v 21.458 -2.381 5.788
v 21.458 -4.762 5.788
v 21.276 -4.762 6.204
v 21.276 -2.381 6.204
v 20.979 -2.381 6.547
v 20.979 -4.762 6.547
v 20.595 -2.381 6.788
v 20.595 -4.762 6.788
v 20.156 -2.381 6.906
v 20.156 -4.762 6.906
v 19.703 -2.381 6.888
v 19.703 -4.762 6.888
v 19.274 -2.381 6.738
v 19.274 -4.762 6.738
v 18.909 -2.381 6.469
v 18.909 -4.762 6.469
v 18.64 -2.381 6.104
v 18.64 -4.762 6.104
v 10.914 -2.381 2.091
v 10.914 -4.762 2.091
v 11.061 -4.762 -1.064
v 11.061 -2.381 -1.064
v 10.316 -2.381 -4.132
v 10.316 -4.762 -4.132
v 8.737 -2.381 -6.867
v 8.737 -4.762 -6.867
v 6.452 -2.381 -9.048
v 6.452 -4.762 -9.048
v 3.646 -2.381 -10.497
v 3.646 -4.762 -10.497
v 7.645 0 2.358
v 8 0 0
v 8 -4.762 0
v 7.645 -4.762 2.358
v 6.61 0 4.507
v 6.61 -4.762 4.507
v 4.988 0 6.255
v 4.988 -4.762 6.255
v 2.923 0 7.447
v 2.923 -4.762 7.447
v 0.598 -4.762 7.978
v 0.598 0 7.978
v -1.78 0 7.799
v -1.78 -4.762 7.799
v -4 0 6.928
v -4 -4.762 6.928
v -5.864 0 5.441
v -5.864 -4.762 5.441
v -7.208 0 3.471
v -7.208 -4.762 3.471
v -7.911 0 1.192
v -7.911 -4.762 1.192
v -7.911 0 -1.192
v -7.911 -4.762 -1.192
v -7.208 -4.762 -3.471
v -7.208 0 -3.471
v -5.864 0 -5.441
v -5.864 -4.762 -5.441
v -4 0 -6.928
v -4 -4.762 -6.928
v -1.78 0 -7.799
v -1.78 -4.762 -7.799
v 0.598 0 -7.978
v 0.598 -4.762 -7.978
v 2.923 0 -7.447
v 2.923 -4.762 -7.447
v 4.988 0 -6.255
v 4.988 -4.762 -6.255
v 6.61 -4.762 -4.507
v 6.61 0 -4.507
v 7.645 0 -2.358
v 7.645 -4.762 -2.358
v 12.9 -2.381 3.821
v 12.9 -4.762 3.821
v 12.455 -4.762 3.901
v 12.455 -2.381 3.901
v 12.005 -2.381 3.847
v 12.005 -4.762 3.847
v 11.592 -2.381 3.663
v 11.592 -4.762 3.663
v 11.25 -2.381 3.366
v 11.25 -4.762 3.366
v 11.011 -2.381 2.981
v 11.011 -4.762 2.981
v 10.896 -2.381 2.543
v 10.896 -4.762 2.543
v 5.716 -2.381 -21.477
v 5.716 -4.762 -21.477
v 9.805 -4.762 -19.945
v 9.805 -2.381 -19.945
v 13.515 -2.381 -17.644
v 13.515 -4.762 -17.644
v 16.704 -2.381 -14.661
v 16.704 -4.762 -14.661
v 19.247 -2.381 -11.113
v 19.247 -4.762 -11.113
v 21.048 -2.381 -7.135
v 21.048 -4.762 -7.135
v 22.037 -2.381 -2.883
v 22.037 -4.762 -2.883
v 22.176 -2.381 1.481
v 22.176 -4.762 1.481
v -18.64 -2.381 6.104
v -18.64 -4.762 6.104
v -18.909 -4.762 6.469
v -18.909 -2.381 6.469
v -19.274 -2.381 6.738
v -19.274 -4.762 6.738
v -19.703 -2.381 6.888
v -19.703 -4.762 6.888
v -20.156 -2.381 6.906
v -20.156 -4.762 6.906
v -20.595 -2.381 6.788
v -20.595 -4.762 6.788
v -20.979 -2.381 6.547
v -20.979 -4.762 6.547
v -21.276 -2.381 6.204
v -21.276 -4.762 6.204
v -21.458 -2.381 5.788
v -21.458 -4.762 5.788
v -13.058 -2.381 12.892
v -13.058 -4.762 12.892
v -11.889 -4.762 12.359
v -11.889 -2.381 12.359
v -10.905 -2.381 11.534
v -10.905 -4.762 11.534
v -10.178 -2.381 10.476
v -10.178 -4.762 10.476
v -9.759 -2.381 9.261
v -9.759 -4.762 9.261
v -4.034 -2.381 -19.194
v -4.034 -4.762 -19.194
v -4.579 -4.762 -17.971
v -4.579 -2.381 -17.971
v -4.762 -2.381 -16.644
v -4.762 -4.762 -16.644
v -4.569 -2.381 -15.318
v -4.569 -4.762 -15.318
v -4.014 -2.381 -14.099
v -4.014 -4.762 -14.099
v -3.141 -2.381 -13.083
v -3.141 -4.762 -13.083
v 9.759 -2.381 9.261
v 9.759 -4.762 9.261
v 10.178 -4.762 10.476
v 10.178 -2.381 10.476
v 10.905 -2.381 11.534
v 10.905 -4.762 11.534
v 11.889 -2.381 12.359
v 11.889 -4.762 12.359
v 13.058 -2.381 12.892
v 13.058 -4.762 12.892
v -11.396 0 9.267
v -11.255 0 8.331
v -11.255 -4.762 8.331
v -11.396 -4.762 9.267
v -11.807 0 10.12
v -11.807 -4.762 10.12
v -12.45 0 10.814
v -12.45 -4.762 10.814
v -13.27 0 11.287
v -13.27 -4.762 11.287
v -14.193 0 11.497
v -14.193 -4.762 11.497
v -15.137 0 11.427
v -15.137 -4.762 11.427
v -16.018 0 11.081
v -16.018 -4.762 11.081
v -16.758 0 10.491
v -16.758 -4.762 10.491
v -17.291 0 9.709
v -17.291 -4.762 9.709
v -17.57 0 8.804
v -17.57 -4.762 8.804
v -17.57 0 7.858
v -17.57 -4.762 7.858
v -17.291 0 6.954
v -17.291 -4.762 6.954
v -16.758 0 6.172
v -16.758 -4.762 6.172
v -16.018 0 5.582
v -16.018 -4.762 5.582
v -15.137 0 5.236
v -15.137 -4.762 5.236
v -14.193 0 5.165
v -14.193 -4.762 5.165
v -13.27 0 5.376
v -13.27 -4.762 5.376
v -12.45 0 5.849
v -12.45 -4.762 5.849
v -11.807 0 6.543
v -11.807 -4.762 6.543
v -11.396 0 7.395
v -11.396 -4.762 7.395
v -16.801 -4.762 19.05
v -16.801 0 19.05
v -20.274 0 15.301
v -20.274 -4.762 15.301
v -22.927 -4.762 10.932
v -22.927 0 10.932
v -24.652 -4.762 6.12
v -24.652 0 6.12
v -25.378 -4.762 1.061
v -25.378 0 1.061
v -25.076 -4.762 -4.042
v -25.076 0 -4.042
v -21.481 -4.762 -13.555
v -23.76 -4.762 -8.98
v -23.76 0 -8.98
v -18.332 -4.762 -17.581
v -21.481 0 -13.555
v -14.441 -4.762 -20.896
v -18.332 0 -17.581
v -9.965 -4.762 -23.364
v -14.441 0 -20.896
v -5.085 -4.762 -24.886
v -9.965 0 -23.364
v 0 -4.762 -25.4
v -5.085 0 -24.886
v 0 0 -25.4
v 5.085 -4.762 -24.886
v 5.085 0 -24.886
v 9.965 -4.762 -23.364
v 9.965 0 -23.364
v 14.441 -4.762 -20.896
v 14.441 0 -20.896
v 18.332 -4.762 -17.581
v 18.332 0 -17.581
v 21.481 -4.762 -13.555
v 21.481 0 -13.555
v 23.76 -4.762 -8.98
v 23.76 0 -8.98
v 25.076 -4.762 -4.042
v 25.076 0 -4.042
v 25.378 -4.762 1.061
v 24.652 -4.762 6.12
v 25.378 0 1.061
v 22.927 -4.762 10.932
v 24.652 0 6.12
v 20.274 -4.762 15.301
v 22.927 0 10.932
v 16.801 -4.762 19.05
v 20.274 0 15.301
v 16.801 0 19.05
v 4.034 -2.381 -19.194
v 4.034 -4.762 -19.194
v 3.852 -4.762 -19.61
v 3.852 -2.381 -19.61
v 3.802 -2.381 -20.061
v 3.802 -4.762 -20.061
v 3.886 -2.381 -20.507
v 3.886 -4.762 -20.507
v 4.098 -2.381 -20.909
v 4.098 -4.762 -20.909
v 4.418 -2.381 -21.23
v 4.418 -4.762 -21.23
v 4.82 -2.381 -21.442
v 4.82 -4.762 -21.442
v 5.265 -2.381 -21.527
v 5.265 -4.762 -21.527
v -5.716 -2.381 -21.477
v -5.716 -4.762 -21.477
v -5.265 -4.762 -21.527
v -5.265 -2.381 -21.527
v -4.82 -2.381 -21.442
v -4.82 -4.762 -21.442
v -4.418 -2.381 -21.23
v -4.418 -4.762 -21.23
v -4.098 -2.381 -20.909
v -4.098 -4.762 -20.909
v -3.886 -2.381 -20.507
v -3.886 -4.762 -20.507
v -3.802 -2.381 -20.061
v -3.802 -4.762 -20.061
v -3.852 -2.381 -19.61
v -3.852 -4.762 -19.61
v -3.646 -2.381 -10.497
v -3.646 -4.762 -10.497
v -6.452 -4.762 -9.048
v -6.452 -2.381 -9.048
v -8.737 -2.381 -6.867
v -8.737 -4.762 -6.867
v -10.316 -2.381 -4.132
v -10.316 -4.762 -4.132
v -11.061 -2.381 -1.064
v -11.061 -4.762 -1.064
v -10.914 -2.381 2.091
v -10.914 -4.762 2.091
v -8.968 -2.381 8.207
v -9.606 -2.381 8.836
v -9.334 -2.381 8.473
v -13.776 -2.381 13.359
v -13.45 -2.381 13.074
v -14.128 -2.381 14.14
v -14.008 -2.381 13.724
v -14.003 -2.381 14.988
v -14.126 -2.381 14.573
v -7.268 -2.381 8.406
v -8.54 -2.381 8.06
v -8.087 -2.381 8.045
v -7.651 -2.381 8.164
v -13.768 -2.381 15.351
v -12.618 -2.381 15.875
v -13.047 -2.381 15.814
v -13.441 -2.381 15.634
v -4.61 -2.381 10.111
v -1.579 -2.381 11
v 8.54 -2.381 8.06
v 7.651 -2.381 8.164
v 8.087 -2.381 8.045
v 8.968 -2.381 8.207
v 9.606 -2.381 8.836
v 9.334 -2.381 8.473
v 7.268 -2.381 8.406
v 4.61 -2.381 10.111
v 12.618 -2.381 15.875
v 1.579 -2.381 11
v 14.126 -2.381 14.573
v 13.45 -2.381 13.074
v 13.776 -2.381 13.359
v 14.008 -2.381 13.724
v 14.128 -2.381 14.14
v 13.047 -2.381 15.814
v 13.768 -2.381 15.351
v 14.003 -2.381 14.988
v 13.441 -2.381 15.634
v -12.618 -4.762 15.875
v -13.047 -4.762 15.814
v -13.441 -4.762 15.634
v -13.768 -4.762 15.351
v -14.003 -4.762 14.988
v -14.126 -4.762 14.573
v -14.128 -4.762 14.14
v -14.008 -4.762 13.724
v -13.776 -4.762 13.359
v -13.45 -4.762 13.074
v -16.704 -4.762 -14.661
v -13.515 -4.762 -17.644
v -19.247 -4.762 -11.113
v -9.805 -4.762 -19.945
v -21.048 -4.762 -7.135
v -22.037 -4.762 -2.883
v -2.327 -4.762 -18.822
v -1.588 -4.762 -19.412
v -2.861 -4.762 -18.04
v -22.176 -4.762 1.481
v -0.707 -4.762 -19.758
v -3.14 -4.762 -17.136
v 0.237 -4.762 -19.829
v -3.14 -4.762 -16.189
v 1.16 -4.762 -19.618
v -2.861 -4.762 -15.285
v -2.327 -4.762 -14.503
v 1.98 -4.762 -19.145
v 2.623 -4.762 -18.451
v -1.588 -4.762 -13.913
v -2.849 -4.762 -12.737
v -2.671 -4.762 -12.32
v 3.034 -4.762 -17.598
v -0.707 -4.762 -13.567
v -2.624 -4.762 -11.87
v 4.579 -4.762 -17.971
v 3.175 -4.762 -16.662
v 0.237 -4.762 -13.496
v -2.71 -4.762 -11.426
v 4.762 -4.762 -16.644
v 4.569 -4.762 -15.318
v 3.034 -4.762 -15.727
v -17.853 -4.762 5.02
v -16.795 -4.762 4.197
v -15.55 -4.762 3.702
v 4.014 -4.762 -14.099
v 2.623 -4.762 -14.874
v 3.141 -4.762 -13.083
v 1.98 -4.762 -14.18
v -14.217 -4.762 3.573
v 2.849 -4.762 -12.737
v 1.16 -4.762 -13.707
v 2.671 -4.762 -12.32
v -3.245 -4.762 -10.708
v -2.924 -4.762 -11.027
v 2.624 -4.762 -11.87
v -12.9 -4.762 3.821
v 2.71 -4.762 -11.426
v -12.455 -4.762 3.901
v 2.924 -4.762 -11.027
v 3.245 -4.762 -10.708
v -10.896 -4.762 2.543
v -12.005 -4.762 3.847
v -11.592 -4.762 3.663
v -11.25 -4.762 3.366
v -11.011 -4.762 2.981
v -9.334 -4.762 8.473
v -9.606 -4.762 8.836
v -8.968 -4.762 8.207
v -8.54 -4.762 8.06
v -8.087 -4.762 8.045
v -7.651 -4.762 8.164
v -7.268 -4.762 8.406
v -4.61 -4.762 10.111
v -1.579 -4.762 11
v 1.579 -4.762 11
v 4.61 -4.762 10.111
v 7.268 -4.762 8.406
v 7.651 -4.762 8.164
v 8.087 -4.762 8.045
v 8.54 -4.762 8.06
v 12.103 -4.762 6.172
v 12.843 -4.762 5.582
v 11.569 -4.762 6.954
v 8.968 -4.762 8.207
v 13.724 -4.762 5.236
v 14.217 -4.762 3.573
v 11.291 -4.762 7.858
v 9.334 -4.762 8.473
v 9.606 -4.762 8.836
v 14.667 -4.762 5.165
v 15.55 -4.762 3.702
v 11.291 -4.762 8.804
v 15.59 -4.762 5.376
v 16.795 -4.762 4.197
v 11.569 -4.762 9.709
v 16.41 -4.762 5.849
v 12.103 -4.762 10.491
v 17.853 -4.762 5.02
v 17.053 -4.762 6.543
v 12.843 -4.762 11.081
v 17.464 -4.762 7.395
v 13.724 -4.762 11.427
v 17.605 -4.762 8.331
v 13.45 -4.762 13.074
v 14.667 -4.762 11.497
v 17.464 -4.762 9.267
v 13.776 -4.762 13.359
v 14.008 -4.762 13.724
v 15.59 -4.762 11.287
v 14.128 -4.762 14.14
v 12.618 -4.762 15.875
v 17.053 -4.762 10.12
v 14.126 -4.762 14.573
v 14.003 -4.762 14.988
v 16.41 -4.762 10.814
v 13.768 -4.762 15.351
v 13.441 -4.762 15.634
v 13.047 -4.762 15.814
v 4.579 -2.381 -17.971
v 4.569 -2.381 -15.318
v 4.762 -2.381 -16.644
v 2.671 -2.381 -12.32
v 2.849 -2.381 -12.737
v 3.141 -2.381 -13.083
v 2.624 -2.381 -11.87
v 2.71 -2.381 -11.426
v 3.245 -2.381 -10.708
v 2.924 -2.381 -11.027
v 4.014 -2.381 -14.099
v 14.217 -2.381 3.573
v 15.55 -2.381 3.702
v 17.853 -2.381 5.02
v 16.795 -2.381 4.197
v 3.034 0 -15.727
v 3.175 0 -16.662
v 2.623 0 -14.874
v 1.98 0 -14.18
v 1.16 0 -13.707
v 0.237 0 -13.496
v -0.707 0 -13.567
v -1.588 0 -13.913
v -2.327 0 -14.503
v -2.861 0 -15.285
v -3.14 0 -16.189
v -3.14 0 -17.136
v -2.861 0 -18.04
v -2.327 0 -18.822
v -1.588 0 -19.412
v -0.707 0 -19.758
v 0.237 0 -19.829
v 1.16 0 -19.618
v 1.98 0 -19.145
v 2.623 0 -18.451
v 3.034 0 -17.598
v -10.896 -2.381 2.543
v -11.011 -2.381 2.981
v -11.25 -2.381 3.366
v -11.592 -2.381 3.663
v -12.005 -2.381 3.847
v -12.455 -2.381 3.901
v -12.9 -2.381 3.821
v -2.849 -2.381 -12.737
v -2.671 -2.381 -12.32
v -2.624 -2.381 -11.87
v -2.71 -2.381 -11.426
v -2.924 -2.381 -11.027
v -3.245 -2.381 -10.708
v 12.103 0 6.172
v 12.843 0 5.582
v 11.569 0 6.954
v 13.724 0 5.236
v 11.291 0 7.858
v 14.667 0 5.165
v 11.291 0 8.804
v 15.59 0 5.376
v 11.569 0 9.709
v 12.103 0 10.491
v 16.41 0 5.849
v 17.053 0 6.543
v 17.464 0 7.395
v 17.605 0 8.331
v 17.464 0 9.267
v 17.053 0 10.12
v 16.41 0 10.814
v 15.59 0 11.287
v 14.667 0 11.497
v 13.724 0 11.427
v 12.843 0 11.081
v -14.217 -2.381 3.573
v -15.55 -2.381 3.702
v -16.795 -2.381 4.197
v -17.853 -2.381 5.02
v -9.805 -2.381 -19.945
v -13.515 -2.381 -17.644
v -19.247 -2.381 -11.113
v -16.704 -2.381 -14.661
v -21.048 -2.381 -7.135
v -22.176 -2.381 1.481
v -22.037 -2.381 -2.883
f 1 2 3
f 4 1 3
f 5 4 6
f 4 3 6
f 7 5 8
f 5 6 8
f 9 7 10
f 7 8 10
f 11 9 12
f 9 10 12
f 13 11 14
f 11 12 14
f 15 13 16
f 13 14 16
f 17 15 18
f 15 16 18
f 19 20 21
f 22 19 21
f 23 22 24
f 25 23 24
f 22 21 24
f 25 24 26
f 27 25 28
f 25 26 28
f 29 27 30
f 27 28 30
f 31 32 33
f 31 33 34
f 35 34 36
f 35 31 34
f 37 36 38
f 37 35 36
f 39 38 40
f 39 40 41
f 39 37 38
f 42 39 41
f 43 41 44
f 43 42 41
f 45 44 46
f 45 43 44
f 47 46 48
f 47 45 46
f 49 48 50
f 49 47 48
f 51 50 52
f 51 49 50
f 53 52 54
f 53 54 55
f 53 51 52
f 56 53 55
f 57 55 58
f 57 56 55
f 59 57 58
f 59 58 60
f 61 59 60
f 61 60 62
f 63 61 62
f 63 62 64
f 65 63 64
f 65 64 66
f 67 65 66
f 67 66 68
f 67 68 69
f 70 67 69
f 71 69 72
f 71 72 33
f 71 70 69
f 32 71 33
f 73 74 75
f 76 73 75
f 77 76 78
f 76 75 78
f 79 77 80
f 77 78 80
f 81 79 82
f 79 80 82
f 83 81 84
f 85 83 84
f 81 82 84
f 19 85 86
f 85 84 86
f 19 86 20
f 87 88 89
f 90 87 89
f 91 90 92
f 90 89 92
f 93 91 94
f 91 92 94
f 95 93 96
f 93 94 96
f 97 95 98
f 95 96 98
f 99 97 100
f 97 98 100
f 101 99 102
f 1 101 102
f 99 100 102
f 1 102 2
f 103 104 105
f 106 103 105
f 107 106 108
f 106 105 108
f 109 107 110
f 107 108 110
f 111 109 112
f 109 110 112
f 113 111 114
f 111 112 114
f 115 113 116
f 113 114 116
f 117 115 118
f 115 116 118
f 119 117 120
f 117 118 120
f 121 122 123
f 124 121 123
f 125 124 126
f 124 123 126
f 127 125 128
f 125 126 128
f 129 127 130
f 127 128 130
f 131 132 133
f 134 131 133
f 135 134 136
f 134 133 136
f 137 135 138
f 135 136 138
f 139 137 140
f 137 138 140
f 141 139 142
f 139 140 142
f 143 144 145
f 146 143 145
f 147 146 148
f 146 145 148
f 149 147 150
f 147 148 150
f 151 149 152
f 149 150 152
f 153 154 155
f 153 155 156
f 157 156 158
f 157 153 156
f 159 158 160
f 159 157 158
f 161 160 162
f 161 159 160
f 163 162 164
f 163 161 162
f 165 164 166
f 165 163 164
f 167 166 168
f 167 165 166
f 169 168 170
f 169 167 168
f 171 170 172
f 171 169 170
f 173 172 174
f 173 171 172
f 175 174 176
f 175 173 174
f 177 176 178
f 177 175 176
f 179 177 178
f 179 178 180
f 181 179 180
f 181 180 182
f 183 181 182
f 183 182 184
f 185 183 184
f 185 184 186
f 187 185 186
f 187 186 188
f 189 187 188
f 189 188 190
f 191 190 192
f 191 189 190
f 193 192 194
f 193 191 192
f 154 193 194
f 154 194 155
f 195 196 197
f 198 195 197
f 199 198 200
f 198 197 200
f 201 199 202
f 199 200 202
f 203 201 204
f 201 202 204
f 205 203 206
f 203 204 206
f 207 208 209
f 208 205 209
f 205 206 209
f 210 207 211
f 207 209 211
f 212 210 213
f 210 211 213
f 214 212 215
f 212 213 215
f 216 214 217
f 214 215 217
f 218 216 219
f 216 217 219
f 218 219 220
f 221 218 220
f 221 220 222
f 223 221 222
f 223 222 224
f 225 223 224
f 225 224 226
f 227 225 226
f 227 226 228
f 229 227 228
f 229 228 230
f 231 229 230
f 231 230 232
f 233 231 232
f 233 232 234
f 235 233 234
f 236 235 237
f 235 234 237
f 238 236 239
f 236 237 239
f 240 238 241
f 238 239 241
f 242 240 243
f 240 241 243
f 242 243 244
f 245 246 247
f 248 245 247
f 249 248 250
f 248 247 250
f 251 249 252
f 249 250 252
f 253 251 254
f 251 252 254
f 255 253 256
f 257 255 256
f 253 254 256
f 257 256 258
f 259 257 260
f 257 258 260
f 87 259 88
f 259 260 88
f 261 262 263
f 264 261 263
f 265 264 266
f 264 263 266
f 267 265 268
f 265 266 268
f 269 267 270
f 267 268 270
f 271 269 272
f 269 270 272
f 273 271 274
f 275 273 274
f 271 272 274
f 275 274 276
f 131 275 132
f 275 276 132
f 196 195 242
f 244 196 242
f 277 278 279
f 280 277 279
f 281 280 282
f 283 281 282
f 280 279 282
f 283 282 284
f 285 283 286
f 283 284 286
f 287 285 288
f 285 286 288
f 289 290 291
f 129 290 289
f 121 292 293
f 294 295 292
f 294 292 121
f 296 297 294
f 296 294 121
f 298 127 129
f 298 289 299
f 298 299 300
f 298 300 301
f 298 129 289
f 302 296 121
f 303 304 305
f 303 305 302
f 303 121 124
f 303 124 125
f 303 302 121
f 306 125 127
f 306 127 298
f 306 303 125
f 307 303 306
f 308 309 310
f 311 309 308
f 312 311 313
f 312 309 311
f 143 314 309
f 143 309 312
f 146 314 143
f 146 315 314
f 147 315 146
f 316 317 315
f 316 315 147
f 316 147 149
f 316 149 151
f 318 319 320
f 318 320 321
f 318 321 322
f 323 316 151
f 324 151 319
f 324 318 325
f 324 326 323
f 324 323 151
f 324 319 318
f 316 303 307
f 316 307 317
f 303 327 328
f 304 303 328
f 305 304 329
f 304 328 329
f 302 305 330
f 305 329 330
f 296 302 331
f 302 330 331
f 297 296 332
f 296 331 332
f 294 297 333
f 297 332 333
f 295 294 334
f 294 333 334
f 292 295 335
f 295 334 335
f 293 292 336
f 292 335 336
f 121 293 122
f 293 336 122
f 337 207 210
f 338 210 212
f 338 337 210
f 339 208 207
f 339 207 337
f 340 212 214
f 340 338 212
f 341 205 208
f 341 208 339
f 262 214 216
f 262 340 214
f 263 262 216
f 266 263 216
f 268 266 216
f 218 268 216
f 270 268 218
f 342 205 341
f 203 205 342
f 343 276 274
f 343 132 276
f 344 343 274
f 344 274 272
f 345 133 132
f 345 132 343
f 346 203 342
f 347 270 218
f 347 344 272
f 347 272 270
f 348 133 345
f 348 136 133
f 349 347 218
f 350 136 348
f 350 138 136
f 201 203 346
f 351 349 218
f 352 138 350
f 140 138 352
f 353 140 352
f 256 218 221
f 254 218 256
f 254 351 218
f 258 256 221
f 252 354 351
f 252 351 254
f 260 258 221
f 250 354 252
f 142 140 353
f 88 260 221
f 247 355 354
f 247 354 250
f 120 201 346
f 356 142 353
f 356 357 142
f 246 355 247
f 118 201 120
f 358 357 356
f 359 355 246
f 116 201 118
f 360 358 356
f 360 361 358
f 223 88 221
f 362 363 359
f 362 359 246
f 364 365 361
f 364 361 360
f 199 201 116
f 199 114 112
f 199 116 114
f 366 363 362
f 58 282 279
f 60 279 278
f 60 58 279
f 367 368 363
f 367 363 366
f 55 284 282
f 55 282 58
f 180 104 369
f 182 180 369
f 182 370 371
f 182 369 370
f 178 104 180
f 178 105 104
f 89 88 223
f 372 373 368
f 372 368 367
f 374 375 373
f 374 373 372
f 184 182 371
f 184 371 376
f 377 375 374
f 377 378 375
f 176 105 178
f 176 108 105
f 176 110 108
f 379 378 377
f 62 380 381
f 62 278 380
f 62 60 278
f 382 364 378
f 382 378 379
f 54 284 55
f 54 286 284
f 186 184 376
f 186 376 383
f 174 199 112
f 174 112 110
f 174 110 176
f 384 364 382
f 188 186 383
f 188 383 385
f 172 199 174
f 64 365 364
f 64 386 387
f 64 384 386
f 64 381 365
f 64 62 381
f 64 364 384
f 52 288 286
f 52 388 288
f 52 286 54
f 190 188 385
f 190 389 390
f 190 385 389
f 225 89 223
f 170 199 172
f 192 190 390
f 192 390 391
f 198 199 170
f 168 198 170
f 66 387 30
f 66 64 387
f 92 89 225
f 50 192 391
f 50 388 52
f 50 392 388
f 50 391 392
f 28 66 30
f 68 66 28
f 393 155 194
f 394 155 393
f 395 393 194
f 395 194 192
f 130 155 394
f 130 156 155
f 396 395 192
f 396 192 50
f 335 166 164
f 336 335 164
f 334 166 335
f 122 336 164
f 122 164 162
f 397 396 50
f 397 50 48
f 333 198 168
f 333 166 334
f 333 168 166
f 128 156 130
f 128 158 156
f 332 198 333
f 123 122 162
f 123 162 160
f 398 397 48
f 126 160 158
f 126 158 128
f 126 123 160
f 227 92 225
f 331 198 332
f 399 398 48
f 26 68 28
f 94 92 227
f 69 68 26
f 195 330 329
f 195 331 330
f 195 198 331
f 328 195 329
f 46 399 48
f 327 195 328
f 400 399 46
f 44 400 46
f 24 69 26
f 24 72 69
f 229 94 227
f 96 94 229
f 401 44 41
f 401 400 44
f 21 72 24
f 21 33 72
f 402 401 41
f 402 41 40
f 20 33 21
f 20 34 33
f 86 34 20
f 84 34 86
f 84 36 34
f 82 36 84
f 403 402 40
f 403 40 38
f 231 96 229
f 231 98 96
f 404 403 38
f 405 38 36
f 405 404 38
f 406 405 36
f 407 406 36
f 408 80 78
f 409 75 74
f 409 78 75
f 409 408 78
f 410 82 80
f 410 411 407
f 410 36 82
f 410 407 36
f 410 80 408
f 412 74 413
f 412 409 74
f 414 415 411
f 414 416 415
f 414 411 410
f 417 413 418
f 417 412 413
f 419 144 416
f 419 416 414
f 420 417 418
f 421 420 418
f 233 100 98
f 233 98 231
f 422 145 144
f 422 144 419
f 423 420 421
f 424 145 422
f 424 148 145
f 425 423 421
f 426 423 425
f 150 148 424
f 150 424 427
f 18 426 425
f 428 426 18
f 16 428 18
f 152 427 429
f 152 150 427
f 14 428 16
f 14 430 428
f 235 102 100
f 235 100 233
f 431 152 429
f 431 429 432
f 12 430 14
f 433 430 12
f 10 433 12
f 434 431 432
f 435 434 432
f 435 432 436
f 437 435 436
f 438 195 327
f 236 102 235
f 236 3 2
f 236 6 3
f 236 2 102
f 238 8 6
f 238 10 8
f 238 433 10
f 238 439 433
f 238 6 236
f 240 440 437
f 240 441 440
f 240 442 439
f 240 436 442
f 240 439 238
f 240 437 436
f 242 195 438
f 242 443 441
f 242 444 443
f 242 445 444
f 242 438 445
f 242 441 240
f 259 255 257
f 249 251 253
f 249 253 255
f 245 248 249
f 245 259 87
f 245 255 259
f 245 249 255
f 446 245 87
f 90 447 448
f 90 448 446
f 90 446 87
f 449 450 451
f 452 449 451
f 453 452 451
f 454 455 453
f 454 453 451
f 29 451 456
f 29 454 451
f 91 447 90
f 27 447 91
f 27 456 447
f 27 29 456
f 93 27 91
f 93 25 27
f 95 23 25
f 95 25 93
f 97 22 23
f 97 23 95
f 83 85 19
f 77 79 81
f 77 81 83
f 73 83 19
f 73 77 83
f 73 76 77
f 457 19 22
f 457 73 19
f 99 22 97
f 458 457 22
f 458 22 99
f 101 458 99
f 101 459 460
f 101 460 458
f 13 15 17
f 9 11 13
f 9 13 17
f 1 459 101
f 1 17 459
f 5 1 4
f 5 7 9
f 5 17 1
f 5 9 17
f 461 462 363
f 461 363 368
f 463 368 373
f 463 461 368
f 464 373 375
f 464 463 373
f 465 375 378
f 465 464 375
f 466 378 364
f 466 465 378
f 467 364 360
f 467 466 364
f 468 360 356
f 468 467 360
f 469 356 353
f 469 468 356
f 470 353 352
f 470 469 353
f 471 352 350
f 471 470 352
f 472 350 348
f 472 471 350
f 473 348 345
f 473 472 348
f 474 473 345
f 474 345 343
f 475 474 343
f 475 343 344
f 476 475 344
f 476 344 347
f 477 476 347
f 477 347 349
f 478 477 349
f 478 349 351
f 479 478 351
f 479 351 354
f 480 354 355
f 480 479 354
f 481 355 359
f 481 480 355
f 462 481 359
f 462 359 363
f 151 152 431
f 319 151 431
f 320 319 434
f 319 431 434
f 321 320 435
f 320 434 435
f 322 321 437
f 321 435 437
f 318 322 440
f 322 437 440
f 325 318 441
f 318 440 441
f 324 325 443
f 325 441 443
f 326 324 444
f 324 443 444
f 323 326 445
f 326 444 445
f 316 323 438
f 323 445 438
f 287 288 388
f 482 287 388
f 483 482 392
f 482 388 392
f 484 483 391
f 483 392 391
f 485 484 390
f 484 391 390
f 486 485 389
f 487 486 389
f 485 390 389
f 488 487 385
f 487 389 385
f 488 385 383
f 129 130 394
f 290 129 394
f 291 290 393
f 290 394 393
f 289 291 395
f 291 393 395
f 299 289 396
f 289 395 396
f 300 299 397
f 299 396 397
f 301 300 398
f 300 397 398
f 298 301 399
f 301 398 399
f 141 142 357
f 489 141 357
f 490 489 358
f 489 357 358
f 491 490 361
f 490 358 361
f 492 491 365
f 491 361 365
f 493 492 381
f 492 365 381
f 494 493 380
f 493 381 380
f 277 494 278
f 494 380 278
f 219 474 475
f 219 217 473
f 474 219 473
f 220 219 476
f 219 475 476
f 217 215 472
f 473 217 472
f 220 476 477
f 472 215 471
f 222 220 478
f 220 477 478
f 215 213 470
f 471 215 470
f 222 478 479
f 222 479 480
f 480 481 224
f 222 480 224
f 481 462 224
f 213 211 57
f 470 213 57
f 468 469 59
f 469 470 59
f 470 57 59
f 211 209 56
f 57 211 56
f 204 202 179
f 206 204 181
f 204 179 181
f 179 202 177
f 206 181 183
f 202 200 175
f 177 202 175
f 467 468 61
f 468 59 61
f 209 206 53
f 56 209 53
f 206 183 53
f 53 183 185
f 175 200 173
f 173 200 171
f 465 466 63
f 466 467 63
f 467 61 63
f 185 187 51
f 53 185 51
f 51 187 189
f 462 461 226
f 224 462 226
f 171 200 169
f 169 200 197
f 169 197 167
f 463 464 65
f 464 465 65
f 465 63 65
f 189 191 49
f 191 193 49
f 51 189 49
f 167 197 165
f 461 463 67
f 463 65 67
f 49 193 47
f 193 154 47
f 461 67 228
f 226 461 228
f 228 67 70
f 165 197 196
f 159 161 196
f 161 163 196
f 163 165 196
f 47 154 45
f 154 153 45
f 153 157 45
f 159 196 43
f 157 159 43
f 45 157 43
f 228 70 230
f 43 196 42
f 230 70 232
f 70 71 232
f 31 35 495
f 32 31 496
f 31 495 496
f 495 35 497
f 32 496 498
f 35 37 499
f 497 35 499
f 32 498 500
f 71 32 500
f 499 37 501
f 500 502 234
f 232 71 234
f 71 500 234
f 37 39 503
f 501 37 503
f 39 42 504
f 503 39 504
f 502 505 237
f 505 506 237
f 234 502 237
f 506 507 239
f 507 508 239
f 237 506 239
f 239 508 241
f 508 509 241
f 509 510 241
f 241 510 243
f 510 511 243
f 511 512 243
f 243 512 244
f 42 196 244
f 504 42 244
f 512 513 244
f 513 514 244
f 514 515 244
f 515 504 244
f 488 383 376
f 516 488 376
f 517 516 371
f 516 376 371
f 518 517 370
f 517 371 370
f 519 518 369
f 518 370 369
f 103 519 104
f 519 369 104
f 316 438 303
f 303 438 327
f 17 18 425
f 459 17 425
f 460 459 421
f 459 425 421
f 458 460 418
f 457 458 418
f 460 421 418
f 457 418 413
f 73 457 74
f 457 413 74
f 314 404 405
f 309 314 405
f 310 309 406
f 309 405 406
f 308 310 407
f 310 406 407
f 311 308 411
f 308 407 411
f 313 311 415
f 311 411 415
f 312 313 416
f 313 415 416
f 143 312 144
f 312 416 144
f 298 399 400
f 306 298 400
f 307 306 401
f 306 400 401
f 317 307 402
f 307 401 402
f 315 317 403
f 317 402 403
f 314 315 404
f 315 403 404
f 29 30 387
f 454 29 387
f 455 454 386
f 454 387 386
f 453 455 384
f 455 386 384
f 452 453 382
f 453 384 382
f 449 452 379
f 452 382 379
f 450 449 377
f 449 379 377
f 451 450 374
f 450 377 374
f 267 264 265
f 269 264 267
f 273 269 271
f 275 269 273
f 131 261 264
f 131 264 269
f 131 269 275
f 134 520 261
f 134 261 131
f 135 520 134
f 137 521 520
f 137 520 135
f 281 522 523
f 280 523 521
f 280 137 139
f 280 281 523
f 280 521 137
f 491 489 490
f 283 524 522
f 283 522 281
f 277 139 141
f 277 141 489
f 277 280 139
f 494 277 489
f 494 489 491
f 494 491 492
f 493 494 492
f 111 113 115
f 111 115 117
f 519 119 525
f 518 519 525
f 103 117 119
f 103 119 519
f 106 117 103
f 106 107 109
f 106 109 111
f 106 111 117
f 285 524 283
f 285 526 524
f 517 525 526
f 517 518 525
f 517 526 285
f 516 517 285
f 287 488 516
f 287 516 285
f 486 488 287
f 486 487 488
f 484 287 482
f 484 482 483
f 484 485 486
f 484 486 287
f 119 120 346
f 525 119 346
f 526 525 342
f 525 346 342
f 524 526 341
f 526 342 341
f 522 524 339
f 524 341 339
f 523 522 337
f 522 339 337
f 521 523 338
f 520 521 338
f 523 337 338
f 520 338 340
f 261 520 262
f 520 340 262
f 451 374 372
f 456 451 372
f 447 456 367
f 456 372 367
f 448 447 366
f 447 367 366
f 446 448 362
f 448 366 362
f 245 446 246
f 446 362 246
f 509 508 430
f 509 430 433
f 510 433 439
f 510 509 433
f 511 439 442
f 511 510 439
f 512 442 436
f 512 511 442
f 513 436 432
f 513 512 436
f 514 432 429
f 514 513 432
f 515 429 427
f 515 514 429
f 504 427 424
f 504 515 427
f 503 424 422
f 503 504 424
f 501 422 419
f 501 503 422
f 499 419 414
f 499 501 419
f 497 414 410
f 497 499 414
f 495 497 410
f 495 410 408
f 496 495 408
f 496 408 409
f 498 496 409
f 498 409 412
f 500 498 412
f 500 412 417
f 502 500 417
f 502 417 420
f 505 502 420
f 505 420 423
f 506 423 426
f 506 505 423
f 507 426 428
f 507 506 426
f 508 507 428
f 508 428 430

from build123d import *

# Parameters (mm, degrees)
F0_R     = 25.4
F0_R_2   = 3.175
F0_R_3   = 8
F1_DEPTH = 4.7625
F2_W     = 50.561215
F2_H     = 14.34433
F3_DEPTH = 25.4
F5_DEPTH = 2.38125


with BuildPart() as f1:
    # F0 (on Front) → F1 (new body)
    with BuildSketch(Plane.XZ):
        Circle(F0_R)
        with Locations((0, -16.6624)):
            Circle(F0_R_2, mode=Mode.SUBTRACT)
        Circle(F0_R_3, mode=Mode.SUBTRACT)
        with Locations((-14.430062, 8.3312)):
            Circle(F0_R_2, mode=Mode.SUBTRACT)
        with Locations((14.430062, 8.3312)):
            Circle(F0_R_2, mode=Mode.SUBTRACT)
    extrude(amount=F1_DEPTH)

    # F2 (on face) → F3 (cut)
    with BuildSketch(Plane.XZ.offset(4.7625)):
        with Locations((0.75591, 26.222165)):
            Rectangle(F2_W, F2_H)
    extrude(amount=-F3_DEPTH, mode=Mode.SUBTRACT)

    # F4 (on face) → F5 (cut)
    with BuildSketch(Plane.XZ.offset(4.7625)):
        with BuildLine():
            ThreePointArc((-3.646079, -10.497322), (-9.623707, -5.55625), (-10.913987, 2.091064))
            ThreePointArc((-10.913987, 2.091064), (-11.409826, 3.527057), (-12.900289, 3.821078))
            ThreePointArc((-12.900289, 3.821078), (-16.190201, 3.905896), (-18.639619, 6.103863))
            ThreePointArc((-18.639619, 6.103863), (-20.156405, 6.905634), (-21.458089, 5.788007))
            ThreePointArc((-21.458089, 5.788007), (-19.247415, -11.1125), (-5.716484, -21.477254))
            ThreePointArc((-5.716484, -21.477254), (-4.097748, -20.908775), (-4.033709, -19.194315))
            ThreePointArc((-4.033709, -19.194315), (-4.712495, -15.974073), (-3.140994, -13.082517))
            ThreePointArc((-3.140994, -13.082517), (-2.650392, -11.644727), (-3.646079, -10.497322))
        make_face()
        with BuildLine():
            ThreePointArc((-7.267908, 8.406258), (0, 11.1125), (7.267908, 8.406258))
            ThreePointArc((7.267908, 8.406258), (8.759433, 8.11767), (9.759295, 9.261439))
            ThreePointArc((9.759295, 9.261439), (10.905182, 11.533797), (13.057597, 12.891655))
            ThreePointArc((13.057597, 12.891655), (14.126157, 14.572961), (12.618408, 15.875))
            Line((12.618408, 15.875), (-12.618408, 15.875))
            ThreePointArc((-12.618408, 15.875), (-14.126157, 14.572961), (-13.057597, 12.891655))
            ThreePointArc((-13.057597, 12.891655), (-10.905182, 11.533797), (-9.759295, 9.261439))
            ThreePointArc((-9.759295, 9.261439), (-8.759433, 8.11767), (-7.267908, 8.406258))
        make_face()
        with BuildLine():
            ThreePointArc((10.913987, 2.091064), (9.623707, -5.55625), (3.646079, -10.497322))
            ThreePointArc((3.646079, -10.497322), (2.650392, -11.644727), (3.140994, -13.082517))
            ThreePointArc((3.140994, -13.082517), (4.712495, -15.974073), (4.033709, -19.194315))
            ThreePointArc((4.033709, -19.194315), (4.097748, -20.908775), (5.716484, -21.477254))
            ThreePointArc((5.716484, -21.477254), (19.247415, -11.1125), (21.458089, 5.788007))
            ThreePointArc((21.458089, 5.788007), (20.156405, 6.905634), (18.639619, 6.103863))
            ThreePointArc((18.639619, 6.103863), (16.190201, 3.905896), (12.900289, 3.821078))
            ThreePointArc((12.900289, 3.821078), (11.409826, 3.527057), (10.913987, 2.091064))
        make_face()
    extrude(amount=-F5_DEPTH, mode=Mode.SUBTRACT)


solid = f1.part
